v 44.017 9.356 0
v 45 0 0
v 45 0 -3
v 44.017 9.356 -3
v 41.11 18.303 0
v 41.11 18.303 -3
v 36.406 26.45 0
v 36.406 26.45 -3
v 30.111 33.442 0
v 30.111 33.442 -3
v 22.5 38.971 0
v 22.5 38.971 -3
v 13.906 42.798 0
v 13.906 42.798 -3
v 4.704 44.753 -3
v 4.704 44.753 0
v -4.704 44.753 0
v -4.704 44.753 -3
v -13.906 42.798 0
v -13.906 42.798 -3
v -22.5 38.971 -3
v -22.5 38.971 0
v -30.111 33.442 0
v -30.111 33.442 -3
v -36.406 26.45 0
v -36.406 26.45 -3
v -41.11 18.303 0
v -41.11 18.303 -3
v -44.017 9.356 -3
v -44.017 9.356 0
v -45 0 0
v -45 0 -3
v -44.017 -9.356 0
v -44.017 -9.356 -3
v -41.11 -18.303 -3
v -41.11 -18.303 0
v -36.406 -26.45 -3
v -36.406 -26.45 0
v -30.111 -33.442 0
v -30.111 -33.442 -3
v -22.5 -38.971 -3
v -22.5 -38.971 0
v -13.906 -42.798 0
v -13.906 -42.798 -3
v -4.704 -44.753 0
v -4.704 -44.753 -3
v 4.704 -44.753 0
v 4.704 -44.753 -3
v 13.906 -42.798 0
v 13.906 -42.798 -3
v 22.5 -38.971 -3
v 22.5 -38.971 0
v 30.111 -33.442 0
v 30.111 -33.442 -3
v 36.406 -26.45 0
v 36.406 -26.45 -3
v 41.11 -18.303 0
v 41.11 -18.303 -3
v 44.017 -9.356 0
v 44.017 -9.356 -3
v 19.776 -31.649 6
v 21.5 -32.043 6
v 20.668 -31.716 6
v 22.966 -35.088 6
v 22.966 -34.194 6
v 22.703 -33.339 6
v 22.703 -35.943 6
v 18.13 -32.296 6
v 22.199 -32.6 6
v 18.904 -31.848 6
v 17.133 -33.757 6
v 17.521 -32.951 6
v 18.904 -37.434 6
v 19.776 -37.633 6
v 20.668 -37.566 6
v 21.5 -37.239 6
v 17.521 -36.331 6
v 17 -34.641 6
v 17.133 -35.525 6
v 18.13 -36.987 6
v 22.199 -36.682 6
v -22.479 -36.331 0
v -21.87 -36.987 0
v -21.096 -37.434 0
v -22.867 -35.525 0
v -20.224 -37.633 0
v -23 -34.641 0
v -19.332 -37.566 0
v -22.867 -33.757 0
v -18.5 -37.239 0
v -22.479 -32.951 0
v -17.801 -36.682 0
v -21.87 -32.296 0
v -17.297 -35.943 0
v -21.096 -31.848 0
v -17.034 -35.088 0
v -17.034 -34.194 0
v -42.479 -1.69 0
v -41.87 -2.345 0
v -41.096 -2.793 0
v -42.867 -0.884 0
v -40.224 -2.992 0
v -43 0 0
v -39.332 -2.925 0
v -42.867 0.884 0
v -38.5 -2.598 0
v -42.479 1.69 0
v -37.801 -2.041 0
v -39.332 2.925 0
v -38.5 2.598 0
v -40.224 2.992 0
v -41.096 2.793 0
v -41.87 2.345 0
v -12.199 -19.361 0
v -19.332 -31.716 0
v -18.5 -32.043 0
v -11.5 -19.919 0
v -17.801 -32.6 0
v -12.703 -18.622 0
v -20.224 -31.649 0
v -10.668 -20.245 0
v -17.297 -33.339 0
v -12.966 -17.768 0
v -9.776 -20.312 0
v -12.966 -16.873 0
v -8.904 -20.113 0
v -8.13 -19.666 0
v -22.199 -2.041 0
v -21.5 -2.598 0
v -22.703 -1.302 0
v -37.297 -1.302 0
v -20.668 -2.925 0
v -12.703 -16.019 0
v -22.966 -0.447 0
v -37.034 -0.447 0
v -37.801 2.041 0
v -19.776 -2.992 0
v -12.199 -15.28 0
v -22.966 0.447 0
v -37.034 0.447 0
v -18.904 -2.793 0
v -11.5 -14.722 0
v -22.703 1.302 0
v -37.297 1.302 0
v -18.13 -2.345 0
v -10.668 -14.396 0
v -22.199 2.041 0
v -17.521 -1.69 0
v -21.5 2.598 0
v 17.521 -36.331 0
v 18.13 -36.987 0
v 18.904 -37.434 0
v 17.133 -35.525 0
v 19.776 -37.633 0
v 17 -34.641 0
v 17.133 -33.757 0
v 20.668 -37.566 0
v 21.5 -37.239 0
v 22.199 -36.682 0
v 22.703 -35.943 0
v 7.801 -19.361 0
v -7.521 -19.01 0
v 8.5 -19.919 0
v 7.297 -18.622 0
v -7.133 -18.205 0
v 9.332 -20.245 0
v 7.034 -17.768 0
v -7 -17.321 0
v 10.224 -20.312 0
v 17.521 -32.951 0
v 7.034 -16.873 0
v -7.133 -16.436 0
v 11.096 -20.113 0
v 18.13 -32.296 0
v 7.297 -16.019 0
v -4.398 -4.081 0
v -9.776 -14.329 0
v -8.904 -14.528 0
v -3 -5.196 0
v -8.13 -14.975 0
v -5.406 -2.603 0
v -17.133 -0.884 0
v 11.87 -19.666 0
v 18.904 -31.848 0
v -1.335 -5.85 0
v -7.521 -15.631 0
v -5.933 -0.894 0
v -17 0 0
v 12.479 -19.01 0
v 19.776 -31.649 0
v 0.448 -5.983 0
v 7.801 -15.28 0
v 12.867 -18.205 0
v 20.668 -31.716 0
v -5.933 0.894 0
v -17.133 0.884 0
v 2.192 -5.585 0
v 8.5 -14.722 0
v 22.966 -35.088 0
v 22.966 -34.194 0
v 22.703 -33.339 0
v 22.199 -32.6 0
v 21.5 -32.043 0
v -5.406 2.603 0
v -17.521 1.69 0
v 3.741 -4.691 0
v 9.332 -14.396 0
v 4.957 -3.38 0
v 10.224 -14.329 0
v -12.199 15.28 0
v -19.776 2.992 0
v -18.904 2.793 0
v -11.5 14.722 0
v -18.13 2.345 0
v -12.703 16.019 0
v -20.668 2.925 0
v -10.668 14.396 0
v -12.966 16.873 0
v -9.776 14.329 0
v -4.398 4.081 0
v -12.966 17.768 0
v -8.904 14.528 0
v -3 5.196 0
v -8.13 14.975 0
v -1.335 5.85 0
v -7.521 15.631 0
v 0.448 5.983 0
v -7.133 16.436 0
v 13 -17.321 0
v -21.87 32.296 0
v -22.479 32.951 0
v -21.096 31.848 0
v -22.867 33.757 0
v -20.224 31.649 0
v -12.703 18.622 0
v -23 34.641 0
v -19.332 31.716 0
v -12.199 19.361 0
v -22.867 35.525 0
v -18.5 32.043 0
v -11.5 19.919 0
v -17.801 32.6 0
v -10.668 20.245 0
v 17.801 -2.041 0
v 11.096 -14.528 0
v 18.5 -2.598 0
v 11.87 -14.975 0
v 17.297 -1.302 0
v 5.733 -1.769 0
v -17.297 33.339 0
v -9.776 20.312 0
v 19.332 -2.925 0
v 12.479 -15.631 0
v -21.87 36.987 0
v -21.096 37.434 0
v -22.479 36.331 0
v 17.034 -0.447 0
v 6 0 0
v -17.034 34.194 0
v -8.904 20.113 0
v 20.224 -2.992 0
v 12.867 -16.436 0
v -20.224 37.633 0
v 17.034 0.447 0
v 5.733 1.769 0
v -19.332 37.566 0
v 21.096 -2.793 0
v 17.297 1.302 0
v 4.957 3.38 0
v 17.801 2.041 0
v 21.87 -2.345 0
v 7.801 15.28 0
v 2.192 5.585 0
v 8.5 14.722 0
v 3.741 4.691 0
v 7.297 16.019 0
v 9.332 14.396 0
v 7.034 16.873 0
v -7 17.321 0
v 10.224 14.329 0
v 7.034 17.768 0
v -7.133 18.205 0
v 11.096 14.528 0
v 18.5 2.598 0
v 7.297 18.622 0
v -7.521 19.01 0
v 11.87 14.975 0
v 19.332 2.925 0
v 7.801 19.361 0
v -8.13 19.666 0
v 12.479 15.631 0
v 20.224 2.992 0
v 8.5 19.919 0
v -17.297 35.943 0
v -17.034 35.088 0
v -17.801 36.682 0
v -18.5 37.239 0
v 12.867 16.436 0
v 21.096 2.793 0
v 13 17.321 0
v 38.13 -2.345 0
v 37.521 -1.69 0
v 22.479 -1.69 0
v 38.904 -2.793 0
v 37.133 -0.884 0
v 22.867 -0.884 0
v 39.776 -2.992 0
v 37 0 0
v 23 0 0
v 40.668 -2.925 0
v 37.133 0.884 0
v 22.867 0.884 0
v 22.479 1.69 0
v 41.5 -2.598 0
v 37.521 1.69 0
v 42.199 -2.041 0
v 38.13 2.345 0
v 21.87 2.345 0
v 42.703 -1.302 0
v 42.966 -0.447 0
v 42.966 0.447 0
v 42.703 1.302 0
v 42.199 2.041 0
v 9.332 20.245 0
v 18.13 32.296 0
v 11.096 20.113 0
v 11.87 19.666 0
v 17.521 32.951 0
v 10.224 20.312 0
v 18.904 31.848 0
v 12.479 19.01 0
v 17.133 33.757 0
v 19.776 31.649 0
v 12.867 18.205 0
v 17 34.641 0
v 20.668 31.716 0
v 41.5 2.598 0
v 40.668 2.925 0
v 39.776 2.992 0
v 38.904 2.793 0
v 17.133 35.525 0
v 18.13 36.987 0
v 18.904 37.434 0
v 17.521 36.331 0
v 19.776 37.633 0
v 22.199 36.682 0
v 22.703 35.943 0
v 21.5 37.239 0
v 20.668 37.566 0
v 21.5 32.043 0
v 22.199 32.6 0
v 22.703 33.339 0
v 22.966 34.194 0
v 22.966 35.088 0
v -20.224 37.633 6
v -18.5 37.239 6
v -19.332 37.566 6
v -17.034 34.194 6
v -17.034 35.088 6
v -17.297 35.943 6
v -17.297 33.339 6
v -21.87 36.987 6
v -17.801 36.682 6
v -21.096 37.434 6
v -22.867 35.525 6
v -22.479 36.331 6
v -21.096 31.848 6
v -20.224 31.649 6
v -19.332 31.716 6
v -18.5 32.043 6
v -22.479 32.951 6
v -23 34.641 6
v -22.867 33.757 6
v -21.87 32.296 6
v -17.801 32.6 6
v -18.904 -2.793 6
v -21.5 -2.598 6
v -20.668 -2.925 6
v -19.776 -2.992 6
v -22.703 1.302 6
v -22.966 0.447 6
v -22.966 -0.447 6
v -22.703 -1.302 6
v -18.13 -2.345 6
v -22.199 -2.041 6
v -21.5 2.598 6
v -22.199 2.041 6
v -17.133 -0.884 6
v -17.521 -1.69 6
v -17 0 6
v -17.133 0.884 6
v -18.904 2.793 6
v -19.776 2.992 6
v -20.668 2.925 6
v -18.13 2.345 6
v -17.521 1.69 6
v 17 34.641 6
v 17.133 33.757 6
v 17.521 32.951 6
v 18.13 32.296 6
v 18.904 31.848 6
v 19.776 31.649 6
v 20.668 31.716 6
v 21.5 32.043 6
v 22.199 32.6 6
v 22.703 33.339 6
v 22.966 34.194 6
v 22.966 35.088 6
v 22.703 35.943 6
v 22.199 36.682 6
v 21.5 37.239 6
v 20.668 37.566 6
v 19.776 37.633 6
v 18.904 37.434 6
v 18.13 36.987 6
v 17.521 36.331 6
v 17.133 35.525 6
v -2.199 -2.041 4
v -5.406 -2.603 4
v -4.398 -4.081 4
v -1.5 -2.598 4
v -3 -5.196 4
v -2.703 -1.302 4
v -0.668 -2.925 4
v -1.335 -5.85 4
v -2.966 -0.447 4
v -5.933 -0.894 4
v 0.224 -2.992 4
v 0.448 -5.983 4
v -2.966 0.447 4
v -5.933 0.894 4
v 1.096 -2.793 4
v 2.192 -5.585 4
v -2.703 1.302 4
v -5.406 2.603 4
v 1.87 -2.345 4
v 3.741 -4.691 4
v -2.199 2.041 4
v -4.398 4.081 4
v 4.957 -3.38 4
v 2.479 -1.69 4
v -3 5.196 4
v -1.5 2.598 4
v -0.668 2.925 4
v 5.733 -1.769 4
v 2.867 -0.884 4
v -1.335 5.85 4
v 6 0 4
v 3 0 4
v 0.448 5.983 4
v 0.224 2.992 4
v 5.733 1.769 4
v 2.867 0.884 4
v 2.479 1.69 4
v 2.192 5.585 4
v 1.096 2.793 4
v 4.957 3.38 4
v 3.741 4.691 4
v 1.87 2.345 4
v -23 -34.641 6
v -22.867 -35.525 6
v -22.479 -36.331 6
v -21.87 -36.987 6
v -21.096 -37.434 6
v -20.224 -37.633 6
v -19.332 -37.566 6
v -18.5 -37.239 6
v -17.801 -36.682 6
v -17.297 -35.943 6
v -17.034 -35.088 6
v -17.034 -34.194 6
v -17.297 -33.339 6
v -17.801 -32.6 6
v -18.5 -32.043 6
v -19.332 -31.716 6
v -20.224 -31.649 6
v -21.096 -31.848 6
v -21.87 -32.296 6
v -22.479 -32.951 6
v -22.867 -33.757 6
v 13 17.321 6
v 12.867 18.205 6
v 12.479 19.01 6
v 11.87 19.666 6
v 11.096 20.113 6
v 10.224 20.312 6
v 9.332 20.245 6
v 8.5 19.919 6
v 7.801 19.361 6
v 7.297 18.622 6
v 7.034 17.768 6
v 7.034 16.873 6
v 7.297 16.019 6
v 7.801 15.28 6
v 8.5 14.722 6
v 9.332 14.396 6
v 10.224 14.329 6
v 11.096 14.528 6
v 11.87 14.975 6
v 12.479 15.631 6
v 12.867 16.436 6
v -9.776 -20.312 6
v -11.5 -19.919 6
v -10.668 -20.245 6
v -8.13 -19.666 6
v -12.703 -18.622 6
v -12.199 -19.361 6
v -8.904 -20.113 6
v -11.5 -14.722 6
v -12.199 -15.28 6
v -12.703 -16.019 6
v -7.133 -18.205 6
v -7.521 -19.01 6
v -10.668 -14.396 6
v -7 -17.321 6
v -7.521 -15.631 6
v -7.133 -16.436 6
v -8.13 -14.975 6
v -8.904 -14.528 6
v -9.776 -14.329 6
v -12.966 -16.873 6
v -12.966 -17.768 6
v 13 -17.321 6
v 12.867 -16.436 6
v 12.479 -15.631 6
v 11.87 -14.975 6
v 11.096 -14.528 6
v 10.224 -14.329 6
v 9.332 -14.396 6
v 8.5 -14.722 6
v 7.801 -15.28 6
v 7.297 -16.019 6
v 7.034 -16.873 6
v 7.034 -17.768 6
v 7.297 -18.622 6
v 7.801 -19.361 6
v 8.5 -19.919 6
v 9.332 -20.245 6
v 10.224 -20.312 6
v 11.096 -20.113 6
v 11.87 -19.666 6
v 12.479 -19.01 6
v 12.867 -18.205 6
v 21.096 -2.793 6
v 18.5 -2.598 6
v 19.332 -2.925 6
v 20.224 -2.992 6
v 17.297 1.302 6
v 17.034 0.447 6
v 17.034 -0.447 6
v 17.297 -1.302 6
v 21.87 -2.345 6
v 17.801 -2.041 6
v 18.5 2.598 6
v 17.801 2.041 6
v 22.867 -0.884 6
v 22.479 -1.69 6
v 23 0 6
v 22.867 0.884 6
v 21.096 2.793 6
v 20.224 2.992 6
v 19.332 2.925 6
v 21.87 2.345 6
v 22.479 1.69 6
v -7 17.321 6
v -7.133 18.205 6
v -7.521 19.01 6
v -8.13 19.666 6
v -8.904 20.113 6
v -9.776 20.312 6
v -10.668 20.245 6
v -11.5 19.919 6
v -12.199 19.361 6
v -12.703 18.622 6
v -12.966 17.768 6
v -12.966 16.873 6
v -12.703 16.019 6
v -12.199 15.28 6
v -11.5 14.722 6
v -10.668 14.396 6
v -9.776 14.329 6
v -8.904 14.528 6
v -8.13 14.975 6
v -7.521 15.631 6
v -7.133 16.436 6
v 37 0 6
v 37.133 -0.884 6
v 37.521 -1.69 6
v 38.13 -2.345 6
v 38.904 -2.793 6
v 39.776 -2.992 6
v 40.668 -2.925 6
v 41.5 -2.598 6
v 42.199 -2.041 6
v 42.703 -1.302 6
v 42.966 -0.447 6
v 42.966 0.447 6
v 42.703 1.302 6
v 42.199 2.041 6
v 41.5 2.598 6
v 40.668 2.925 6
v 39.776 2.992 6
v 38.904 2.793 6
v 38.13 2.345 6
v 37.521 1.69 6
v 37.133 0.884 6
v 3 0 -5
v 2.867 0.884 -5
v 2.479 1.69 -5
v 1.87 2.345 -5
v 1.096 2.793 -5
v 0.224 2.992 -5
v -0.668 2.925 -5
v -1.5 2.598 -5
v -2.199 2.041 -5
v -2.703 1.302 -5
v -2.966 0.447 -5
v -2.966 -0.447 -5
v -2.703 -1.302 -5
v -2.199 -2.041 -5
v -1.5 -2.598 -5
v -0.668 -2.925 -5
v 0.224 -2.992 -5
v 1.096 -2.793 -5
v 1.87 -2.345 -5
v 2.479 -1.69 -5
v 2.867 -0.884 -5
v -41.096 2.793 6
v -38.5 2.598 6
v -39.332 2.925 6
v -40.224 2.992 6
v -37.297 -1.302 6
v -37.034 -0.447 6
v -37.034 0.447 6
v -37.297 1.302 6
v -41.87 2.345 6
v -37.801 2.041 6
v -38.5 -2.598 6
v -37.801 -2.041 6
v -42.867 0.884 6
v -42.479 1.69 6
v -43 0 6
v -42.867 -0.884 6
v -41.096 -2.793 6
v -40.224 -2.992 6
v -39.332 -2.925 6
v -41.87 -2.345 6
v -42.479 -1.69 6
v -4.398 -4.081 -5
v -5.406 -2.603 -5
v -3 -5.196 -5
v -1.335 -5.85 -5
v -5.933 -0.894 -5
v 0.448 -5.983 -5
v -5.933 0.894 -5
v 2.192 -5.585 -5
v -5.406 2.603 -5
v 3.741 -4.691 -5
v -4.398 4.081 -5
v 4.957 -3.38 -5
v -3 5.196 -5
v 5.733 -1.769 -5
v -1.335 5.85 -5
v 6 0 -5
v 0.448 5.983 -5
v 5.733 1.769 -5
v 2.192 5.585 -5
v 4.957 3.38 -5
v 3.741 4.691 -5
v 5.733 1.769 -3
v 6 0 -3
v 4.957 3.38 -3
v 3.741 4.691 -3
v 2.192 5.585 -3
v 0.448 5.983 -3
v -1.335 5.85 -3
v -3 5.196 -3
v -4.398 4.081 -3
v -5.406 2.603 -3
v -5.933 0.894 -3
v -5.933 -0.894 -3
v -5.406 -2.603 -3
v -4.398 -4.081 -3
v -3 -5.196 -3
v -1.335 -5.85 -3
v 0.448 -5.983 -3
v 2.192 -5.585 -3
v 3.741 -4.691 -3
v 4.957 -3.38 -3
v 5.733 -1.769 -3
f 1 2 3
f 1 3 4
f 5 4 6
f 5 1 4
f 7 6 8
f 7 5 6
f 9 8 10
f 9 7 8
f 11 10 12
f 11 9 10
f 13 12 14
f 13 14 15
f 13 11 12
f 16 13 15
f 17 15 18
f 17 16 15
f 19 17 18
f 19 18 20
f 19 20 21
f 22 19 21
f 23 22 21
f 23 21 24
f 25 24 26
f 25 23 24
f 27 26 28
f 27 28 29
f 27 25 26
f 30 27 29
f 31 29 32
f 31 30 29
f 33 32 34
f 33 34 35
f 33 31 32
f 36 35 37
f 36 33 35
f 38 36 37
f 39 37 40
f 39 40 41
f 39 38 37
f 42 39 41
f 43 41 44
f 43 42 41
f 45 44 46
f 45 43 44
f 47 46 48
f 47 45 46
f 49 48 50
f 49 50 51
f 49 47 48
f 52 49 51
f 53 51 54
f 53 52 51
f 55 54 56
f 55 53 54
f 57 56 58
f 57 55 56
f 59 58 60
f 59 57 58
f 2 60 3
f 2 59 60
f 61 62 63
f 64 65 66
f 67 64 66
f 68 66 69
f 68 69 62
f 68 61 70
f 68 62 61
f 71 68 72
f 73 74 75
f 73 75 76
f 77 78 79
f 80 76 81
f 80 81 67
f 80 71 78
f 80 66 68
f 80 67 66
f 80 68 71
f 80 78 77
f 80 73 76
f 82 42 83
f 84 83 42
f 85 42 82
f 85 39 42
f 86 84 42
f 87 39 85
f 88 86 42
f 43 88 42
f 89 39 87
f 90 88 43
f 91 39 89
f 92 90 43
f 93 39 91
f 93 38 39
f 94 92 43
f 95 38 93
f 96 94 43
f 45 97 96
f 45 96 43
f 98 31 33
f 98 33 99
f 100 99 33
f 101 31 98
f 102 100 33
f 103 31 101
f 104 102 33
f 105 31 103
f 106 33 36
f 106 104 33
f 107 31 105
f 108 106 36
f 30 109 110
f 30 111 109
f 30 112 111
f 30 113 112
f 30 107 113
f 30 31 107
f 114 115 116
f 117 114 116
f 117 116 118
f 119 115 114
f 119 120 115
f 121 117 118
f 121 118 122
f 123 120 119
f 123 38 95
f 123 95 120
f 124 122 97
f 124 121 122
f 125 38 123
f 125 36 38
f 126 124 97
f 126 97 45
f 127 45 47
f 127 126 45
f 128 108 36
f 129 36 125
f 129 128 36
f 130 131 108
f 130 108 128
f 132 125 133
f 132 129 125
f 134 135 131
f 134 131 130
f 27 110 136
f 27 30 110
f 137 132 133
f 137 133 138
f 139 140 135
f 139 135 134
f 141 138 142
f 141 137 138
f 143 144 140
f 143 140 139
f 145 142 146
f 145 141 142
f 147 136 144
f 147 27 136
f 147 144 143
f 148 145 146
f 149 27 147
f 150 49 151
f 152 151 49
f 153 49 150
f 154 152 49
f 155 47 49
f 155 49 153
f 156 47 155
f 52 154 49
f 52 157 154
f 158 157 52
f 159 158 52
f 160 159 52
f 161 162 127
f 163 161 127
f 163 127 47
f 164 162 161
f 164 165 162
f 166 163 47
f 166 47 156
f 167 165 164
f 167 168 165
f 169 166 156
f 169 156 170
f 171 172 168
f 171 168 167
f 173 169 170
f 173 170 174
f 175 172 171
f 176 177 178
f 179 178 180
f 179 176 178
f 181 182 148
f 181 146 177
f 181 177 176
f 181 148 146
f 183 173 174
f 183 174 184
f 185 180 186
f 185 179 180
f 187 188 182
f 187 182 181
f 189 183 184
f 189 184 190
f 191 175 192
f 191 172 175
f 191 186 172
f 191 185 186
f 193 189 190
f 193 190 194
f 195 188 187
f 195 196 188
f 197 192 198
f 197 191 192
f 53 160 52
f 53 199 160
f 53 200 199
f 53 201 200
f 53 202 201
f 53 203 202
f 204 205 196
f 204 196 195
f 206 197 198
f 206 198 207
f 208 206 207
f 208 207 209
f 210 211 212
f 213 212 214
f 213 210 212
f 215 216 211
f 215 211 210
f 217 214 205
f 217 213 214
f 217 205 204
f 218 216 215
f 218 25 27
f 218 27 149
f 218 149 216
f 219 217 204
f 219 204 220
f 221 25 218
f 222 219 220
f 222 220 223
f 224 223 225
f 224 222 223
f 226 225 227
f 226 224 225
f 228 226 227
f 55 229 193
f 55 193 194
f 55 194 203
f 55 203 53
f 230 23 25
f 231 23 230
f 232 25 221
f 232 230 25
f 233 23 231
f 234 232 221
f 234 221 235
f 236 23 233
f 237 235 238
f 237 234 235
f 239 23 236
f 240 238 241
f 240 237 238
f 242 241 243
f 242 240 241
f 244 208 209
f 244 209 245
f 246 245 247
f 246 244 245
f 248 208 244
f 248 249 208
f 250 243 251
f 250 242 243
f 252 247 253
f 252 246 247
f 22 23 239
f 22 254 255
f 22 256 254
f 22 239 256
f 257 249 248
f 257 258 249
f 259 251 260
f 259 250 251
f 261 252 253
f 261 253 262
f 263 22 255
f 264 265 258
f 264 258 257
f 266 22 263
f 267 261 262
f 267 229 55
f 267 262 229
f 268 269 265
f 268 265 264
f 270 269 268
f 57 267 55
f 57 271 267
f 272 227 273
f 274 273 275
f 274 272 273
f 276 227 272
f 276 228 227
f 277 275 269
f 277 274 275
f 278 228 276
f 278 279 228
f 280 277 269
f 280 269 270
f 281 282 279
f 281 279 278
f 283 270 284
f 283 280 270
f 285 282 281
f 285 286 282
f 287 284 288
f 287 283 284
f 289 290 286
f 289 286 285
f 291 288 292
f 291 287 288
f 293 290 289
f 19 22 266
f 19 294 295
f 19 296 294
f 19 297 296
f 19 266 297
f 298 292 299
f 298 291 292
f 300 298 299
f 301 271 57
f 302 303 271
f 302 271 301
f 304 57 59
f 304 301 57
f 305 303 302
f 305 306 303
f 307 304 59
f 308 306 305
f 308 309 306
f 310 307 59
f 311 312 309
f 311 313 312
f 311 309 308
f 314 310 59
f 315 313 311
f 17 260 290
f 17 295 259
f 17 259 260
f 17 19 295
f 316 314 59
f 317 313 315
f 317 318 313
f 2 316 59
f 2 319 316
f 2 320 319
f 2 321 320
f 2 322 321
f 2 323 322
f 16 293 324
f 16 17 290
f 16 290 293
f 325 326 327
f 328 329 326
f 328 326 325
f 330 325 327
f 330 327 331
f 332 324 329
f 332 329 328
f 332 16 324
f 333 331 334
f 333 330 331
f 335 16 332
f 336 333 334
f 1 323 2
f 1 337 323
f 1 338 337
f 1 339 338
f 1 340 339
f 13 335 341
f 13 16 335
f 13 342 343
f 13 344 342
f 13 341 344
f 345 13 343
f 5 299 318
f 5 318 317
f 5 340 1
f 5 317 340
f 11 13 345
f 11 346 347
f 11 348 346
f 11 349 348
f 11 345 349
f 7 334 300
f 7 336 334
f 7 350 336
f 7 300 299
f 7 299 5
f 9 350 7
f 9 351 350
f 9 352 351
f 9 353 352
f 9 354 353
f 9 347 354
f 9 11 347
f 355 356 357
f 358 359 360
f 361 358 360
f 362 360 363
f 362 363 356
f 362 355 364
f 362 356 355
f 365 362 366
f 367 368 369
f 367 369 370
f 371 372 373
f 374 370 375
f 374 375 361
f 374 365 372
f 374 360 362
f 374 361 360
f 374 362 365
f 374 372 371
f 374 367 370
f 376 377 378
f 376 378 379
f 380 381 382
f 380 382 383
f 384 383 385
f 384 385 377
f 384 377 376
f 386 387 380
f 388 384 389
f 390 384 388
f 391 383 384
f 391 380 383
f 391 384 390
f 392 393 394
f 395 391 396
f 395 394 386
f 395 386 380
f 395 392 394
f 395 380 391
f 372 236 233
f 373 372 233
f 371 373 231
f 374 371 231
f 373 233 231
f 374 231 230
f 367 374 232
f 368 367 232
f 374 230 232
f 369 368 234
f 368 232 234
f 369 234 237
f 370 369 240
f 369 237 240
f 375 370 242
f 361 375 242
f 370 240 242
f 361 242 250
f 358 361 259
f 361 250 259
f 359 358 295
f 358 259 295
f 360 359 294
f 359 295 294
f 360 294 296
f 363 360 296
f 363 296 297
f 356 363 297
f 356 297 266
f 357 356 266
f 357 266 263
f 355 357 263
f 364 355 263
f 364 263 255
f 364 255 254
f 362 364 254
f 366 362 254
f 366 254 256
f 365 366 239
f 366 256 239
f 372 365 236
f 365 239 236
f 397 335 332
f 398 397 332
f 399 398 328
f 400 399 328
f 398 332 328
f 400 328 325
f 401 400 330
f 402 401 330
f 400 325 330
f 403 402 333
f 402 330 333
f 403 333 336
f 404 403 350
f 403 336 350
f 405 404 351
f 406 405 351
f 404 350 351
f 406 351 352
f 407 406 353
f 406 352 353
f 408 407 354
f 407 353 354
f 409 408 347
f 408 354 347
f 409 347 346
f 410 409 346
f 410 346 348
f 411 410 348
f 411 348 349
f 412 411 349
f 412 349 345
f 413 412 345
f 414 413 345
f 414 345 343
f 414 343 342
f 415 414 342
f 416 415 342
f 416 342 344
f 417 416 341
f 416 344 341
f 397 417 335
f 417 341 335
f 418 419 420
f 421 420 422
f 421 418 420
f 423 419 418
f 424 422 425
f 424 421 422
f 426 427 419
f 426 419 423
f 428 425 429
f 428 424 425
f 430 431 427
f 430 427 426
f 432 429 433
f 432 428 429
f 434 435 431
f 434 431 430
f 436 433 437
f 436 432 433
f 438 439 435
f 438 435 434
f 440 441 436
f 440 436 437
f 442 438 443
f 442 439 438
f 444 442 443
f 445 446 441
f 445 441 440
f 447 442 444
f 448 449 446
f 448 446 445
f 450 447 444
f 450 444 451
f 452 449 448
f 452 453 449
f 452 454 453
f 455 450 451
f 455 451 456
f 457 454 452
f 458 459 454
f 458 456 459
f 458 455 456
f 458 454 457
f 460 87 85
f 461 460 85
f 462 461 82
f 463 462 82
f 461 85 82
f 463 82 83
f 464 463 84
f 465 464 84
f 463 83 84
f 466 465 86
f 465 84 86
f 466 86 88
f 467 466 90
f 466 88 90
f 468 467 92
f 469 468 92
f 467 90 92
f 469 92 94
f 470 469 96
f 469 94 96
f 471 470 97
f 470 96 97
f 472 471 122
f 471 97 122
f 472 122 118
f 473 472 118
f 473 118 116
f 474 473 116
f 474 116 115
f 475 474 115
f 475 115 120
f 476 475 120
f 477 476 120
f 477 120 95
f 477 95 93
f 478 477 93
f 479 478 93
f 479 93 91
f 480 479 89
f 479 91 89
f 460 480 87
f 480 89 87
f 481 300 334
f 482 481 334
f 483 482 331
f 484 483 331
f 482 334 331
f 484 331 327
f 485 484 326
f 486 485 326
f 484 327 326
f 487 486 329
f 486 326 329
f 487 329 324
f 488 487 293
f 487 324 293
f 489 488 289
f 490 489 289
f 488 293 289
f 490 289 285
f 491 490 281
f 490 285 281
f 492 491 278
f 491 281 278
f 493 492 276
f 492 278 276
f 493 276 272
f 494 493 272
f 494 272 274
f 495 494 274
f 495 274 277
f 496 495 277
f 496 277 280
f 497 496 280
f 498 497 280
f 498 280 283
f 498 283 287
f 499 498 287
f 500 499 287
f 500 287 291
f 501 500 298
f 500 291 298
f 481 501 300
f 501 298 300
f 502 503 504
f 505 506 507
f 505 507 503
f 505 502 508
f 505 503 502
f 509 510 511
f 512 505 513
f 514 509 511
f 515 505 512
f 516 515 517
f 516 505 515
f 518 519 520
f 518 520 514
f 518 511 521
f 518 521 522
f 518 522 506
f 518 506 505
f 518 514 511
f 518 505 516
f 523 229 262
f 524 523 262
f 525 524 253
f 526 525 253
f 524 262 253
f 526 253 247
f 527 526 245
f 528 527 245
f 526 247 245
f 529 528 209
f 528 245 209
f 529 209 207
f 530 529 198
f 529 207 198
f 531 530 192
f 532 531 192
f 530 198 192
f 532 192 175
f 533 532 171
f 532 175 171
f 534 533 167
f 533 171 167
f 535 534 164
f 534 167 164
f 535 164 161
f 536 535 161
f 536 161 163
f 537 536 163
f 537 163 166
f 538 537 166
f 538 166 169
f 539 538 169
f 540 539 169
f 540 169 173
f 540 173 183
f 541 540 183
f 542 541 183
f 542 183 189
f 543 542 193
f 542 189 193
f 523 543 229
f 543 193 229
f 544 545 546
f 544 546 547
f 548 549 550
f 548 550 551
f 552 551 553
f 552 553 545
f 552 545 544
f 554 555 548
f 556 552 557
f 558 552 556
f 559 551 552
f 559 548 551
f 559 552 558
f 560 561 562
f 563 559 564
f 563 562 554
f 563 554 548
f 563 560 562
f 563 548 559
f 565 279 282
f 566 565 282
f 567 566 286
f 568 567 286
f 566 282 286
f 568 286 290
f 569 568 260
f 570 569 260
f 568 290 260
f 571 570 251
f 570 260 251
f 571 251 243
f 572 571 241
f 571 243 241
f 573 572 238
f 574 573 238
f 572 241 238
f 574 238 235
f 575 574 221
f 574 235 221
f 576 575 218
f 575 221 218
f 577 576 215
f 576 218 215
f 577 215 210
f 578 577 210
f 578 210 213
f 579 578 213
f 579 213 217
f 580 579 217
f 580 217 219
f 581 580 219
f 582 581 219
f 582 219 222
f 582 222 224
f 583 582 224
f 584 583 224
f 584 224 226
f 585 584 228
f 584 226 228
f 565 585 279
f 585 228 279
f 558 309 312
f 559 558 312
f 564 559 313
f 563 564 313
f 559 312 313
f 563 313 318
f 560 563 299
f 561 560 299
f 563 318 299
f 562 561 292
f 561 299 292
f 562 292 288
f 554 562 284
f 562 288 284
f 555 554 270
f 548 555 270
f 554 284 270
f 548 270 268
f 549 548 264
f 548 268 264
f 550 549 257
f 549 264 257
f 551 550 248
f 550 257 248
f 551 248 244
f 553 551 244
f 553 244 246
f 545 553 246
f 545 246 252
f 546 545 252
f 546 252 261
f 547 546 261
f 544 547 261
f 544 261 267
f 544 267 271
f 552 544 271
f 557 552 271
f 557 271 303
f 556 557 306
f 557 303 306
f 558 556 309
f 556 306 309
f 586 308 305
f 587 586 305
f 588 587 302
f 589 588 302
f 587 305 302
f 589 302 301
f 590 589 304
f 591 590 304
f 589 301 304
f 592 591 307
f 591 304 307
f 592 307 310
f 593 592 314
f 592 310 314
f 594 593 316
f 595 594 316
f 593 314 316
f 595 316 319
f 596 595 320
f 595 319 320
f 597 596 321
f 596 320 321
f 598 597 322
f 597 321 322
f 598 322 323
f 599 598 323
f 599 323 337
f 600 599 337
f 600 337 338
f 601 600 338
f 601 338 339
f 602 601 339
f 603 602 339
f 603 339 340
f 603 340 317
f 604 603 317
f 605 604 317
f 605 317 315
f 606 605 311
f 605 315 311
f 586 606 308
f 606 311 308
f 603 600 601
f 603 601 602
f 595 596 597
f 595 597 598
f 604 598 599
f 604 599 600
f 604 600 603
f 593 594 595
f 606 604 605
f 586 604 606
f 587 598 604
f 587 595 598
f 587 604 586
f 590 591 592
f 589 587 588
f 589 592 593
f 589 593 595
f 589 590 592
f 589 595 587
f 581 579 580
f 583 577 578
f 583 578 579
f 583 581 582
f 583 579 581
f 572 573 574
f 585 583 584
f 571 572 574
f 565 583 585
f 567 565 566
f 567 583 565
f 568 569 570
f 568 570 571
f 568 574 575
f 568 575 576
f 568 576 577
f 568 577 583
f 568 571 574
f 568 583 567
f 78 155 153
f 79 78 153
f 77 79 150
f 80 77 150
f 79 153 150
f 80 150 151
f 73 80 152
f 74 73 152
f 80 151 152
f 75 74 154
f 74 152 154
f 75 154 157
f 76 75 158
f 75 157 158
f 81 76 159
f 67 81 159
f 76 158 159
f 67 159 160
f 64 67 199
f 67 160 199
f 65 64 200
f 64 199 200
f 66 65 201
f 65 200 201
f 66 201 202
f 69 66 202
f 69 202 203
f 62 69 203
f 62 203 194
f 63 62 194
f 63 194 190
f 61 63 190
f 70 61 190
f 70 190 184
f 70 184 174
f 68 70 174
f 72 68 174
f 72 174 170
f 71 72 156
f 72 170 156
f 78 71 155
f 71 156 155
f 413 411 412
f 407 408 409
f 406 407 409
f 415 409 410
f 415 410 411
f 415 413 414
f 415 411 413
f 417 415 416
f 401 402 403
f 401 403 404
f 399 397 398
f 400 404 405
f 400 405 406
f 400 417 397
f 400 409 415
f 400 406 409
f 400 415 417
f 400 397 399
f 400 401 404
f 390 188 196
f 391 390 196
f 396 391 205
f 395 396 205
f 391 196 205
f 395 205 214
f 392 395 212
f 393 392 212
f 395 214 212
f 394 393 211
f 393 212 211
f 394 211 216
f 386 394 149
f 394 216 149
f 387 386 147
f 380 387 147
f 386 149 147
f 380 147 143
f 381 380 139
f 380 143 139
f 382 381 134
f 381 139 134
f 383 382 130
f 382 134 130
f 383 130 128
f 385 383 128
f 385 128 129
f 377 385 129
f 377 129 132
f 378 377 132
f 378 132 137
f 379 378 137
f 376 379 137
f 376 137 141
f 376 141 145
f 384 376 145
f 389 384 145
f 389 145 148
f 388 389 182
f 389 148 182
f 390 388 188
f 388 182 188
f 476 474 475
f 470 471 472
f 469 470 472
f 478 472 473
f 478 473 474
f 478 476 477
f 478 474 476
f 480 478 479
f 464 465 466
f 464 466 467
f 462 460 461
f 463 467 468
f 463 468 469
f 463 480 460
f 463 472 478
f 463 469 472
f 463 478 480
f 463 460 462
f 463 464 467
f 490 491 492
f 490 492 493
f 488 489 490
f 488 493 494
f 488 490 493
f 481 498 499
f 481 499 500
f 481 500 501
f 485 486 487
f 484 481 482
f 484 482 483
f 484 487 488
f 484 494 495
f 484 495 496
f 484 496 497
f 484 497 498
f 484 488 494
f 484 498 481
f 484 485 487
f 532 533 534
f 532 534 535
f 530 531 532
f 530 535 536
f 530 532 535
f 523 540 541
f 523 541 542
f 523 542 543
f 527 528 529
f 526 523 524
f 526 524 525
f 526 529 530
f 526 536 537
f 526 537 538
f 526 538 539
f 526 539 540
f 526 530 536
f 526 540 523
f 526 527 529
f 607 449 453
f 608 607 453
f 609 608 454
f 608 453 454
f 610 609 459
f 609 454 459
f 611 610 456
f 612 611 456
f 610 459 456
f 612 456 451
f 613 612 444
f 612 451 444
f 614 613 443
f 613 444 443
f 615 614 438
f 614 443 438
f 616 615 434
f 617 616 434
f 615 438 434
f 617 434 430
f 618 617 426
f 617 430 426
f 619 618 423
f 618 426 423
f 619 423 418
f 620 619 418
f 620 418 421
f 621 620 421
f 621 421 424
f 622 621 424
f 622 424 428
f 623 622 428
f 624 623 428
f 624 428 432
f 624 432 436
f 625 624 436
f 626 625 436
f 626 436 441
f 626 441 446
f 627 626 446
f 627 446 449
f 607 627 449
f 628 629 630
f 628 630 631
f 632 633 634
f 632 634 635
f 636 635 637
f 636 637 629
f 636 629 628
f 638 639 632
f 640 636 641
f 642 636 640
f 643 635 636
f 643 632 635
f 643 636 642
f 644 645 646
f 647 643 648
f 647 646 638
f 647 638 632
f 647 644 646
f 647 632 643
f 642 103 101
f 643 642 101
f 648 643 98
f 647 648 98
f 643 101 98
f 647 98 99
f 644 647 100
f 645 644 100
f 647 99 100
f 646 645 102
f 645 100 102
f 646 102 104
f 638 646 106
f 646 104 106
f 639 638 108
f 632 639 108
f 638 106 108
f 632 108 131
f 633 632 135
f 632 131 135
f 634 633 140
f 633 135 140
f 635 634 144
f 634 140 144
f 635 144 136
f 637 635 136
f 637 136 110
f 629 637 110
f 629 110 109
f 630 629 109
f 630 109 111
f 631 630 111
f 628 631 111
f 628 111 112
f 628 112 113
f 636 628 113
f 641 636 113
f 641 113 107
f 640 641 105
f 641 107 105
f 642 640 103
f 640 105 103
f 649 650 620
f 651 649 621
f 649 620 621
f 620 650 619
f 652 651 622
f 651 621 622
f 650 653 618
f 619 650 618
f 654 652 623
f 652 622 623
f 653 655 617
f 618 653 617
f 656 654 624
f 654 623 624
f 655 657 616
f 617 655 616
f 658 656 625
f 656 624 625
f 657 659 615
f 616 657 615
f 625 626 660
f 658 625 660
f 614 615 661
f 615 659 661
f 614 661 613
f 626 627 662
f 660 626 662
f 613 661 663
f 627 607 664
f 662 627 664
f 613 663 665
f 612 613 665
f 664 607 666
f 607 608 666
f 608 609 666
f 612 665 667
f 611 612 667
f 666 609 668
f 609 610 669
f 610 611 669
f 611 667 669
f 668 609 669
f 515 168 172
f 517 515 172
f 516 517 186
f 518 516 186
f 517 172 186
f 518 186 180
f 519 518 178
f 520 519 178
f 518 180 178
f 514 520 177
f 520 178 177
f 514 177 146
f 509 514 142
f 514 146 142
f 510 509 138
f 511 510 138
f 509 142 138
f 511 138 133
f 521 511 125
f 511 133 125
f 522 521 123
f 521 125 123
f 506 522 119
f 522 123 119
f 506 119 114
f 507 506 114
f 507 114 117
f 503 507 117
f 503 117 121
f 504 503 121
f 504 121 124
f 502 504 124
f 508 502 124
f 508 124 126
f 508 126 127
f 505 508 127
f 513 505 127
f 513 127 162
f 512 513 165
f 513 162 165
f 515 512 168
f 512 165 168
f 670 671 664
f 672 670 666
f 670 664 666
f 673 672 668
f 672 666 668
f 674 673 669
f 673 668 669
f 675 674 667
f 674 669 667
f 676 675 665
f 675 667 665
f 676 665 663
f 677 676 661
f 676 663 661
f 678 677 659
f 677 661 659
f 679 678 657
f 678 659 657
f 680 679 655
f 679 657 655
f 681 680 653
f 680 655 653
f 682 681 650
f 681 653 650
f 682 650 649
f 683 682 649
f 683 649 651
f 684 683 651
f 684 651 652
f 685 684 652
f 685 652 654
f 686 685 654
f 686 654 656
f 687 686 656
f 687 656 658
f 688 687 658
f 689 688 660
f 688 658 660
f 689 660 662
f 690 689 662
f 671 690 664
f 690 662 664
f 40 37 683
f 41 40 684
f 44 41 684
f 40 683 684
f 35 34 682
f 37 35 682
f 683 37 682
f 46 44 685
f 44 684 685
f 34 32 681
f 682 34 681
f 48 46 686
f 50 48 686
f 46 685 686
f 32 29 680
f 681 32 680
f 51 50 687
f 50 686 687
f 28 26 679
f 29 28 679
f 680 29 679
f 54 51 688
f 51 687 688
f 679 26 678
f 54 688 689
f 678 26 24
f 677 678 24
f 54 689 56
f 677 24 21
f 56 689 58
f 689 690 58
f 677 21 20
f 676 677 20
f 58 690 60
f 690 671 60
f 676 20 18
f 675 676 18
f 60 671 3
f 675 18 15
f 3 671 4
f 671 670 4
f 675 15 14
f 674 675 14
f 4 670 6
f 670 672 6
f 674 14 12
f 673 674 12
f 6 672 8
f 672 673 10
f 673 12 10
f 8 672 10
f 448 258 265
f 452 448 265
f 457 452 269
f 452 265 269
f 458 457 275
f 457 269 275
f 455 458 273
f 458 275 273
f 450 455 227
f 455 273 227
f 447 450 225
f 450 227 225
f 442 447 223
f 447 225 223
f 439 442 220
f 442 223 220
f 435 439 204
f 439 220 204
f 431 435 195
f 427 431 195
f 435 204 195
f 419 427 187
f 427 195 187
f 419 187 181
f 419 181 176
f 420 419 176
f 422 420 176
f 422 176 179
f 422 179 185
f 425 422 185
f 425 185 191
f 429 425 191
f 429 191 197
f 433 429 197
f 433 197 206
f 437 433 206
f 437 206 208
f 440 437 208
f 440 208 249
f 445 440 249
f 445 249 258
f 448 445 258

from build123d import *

# Parameters (mm, degrees)
SKETCH_1_R           = 45
EXTRUDE_1_DEPTH      = 3
SKETCH_2_R           = 3
EXTRUDE_2_DEPTH      = 6
EXTRUDE_3_DEPTH      = 4
EXTRUDE_3_DEPTH_BACK = 5
SKETCH_3_R           = 6
CUT_EXTRUDE_1_REACH  = 66.273
SKETCH_4_R           = 3
SKETCH_5_R           = 3
EXTRUDE_4_DEPTH      = 6


with BuildPart() as part:
    # 草图1 → 凸台-拉伸1 (new body)
    with BuildSketch(Plane.XY):
        Circle(SKETCH_1_R)
    extrude(amount=-EXTRUDE_1_DEPTH)

    # 草图2 → 凸台-拉伸2 (add)
    with BuildSketch(Plane.XY):
        with Locations(Location((-40, 0, 0), (0, 0, 180))):
            Circle(SKETCH_2_R)
        with Locations(Location((-20, 34.641016151, 0), (0, 0, 180))):
            Circle(SKETCH_2_R)
        with Locations(Location((20, 34.641016151, 0), (0, 0, 180))):
            Circle(SKETCH_2_R)
        with Locations(Location((40, 0, 0), (0, 0, 180))):
            Circle(SKETCH_2_R)
        with Locations(Location((20, -34.641016151, 0), (0, 0, 180))):
            Circle(SKETCH_2_R)
        with Locations(Location((-20, -34.641016151, 0), (0, 0, 180))):
            Circle(SKETCH_2_R)
    extrude(amount=EXTRUDE_2_DEPTH)

    # 草图3 → 凸台-拉伸3 (add, two sides: drawn at the far end of the back side and taken through both)
    with BuildSketch(Plane.XY.offset(-EXTRUDE_3_DEPTH_BACK)):
        Circle(SKETCH_3_R)
    extrude(amount=EXTRUDE_3_DEPTH + EXTRUDE_3_DEPTH_BACK)

    # 草图4 → 切除-拉伸1 (cut, up to next)
    with BuildSketch(Plane.XY.offset(4), mode=Mode.PRIVATE) as cut_extrude_1_sk1:
        Circle(SKETCH_4_R)
    cut_extrude_1_tool1 = extrude(cut_extrude_1_sk1.sketch, amount=-CUT_EXTRUDE_1_REACH, mode=Mode.PRIVATE) & part.part
    add(cut_extrude_1_tool1.solids().sort_by_distance((0, 0, 4))[0], mode=Mode.SUBTRACT)

    # 草图5 → 凸台-拉伸4 (add)
    with BuildSketch(Plane.XY):
        with Locations((-20, 0)):
            Circle(SKETCH_5_R)
        with Locations((-10, 17.320508076)):
            Circle(SKETCH_5_R)
        with Locations((10, 17.320508076)):
            Circle(SKETCH_5_R)
        with Locations((20, 0)):
            Circle(SKETCH_5_R)
        with Locations((10, -17.320508076)):
            Circle(SKETCH_5_R)
        with Locations((-10, -17.320508076)):
            Circle(SKETCH_5_R)
    extrude(amount=EXTRUDE_4_DEPTH)


solid = part.part
